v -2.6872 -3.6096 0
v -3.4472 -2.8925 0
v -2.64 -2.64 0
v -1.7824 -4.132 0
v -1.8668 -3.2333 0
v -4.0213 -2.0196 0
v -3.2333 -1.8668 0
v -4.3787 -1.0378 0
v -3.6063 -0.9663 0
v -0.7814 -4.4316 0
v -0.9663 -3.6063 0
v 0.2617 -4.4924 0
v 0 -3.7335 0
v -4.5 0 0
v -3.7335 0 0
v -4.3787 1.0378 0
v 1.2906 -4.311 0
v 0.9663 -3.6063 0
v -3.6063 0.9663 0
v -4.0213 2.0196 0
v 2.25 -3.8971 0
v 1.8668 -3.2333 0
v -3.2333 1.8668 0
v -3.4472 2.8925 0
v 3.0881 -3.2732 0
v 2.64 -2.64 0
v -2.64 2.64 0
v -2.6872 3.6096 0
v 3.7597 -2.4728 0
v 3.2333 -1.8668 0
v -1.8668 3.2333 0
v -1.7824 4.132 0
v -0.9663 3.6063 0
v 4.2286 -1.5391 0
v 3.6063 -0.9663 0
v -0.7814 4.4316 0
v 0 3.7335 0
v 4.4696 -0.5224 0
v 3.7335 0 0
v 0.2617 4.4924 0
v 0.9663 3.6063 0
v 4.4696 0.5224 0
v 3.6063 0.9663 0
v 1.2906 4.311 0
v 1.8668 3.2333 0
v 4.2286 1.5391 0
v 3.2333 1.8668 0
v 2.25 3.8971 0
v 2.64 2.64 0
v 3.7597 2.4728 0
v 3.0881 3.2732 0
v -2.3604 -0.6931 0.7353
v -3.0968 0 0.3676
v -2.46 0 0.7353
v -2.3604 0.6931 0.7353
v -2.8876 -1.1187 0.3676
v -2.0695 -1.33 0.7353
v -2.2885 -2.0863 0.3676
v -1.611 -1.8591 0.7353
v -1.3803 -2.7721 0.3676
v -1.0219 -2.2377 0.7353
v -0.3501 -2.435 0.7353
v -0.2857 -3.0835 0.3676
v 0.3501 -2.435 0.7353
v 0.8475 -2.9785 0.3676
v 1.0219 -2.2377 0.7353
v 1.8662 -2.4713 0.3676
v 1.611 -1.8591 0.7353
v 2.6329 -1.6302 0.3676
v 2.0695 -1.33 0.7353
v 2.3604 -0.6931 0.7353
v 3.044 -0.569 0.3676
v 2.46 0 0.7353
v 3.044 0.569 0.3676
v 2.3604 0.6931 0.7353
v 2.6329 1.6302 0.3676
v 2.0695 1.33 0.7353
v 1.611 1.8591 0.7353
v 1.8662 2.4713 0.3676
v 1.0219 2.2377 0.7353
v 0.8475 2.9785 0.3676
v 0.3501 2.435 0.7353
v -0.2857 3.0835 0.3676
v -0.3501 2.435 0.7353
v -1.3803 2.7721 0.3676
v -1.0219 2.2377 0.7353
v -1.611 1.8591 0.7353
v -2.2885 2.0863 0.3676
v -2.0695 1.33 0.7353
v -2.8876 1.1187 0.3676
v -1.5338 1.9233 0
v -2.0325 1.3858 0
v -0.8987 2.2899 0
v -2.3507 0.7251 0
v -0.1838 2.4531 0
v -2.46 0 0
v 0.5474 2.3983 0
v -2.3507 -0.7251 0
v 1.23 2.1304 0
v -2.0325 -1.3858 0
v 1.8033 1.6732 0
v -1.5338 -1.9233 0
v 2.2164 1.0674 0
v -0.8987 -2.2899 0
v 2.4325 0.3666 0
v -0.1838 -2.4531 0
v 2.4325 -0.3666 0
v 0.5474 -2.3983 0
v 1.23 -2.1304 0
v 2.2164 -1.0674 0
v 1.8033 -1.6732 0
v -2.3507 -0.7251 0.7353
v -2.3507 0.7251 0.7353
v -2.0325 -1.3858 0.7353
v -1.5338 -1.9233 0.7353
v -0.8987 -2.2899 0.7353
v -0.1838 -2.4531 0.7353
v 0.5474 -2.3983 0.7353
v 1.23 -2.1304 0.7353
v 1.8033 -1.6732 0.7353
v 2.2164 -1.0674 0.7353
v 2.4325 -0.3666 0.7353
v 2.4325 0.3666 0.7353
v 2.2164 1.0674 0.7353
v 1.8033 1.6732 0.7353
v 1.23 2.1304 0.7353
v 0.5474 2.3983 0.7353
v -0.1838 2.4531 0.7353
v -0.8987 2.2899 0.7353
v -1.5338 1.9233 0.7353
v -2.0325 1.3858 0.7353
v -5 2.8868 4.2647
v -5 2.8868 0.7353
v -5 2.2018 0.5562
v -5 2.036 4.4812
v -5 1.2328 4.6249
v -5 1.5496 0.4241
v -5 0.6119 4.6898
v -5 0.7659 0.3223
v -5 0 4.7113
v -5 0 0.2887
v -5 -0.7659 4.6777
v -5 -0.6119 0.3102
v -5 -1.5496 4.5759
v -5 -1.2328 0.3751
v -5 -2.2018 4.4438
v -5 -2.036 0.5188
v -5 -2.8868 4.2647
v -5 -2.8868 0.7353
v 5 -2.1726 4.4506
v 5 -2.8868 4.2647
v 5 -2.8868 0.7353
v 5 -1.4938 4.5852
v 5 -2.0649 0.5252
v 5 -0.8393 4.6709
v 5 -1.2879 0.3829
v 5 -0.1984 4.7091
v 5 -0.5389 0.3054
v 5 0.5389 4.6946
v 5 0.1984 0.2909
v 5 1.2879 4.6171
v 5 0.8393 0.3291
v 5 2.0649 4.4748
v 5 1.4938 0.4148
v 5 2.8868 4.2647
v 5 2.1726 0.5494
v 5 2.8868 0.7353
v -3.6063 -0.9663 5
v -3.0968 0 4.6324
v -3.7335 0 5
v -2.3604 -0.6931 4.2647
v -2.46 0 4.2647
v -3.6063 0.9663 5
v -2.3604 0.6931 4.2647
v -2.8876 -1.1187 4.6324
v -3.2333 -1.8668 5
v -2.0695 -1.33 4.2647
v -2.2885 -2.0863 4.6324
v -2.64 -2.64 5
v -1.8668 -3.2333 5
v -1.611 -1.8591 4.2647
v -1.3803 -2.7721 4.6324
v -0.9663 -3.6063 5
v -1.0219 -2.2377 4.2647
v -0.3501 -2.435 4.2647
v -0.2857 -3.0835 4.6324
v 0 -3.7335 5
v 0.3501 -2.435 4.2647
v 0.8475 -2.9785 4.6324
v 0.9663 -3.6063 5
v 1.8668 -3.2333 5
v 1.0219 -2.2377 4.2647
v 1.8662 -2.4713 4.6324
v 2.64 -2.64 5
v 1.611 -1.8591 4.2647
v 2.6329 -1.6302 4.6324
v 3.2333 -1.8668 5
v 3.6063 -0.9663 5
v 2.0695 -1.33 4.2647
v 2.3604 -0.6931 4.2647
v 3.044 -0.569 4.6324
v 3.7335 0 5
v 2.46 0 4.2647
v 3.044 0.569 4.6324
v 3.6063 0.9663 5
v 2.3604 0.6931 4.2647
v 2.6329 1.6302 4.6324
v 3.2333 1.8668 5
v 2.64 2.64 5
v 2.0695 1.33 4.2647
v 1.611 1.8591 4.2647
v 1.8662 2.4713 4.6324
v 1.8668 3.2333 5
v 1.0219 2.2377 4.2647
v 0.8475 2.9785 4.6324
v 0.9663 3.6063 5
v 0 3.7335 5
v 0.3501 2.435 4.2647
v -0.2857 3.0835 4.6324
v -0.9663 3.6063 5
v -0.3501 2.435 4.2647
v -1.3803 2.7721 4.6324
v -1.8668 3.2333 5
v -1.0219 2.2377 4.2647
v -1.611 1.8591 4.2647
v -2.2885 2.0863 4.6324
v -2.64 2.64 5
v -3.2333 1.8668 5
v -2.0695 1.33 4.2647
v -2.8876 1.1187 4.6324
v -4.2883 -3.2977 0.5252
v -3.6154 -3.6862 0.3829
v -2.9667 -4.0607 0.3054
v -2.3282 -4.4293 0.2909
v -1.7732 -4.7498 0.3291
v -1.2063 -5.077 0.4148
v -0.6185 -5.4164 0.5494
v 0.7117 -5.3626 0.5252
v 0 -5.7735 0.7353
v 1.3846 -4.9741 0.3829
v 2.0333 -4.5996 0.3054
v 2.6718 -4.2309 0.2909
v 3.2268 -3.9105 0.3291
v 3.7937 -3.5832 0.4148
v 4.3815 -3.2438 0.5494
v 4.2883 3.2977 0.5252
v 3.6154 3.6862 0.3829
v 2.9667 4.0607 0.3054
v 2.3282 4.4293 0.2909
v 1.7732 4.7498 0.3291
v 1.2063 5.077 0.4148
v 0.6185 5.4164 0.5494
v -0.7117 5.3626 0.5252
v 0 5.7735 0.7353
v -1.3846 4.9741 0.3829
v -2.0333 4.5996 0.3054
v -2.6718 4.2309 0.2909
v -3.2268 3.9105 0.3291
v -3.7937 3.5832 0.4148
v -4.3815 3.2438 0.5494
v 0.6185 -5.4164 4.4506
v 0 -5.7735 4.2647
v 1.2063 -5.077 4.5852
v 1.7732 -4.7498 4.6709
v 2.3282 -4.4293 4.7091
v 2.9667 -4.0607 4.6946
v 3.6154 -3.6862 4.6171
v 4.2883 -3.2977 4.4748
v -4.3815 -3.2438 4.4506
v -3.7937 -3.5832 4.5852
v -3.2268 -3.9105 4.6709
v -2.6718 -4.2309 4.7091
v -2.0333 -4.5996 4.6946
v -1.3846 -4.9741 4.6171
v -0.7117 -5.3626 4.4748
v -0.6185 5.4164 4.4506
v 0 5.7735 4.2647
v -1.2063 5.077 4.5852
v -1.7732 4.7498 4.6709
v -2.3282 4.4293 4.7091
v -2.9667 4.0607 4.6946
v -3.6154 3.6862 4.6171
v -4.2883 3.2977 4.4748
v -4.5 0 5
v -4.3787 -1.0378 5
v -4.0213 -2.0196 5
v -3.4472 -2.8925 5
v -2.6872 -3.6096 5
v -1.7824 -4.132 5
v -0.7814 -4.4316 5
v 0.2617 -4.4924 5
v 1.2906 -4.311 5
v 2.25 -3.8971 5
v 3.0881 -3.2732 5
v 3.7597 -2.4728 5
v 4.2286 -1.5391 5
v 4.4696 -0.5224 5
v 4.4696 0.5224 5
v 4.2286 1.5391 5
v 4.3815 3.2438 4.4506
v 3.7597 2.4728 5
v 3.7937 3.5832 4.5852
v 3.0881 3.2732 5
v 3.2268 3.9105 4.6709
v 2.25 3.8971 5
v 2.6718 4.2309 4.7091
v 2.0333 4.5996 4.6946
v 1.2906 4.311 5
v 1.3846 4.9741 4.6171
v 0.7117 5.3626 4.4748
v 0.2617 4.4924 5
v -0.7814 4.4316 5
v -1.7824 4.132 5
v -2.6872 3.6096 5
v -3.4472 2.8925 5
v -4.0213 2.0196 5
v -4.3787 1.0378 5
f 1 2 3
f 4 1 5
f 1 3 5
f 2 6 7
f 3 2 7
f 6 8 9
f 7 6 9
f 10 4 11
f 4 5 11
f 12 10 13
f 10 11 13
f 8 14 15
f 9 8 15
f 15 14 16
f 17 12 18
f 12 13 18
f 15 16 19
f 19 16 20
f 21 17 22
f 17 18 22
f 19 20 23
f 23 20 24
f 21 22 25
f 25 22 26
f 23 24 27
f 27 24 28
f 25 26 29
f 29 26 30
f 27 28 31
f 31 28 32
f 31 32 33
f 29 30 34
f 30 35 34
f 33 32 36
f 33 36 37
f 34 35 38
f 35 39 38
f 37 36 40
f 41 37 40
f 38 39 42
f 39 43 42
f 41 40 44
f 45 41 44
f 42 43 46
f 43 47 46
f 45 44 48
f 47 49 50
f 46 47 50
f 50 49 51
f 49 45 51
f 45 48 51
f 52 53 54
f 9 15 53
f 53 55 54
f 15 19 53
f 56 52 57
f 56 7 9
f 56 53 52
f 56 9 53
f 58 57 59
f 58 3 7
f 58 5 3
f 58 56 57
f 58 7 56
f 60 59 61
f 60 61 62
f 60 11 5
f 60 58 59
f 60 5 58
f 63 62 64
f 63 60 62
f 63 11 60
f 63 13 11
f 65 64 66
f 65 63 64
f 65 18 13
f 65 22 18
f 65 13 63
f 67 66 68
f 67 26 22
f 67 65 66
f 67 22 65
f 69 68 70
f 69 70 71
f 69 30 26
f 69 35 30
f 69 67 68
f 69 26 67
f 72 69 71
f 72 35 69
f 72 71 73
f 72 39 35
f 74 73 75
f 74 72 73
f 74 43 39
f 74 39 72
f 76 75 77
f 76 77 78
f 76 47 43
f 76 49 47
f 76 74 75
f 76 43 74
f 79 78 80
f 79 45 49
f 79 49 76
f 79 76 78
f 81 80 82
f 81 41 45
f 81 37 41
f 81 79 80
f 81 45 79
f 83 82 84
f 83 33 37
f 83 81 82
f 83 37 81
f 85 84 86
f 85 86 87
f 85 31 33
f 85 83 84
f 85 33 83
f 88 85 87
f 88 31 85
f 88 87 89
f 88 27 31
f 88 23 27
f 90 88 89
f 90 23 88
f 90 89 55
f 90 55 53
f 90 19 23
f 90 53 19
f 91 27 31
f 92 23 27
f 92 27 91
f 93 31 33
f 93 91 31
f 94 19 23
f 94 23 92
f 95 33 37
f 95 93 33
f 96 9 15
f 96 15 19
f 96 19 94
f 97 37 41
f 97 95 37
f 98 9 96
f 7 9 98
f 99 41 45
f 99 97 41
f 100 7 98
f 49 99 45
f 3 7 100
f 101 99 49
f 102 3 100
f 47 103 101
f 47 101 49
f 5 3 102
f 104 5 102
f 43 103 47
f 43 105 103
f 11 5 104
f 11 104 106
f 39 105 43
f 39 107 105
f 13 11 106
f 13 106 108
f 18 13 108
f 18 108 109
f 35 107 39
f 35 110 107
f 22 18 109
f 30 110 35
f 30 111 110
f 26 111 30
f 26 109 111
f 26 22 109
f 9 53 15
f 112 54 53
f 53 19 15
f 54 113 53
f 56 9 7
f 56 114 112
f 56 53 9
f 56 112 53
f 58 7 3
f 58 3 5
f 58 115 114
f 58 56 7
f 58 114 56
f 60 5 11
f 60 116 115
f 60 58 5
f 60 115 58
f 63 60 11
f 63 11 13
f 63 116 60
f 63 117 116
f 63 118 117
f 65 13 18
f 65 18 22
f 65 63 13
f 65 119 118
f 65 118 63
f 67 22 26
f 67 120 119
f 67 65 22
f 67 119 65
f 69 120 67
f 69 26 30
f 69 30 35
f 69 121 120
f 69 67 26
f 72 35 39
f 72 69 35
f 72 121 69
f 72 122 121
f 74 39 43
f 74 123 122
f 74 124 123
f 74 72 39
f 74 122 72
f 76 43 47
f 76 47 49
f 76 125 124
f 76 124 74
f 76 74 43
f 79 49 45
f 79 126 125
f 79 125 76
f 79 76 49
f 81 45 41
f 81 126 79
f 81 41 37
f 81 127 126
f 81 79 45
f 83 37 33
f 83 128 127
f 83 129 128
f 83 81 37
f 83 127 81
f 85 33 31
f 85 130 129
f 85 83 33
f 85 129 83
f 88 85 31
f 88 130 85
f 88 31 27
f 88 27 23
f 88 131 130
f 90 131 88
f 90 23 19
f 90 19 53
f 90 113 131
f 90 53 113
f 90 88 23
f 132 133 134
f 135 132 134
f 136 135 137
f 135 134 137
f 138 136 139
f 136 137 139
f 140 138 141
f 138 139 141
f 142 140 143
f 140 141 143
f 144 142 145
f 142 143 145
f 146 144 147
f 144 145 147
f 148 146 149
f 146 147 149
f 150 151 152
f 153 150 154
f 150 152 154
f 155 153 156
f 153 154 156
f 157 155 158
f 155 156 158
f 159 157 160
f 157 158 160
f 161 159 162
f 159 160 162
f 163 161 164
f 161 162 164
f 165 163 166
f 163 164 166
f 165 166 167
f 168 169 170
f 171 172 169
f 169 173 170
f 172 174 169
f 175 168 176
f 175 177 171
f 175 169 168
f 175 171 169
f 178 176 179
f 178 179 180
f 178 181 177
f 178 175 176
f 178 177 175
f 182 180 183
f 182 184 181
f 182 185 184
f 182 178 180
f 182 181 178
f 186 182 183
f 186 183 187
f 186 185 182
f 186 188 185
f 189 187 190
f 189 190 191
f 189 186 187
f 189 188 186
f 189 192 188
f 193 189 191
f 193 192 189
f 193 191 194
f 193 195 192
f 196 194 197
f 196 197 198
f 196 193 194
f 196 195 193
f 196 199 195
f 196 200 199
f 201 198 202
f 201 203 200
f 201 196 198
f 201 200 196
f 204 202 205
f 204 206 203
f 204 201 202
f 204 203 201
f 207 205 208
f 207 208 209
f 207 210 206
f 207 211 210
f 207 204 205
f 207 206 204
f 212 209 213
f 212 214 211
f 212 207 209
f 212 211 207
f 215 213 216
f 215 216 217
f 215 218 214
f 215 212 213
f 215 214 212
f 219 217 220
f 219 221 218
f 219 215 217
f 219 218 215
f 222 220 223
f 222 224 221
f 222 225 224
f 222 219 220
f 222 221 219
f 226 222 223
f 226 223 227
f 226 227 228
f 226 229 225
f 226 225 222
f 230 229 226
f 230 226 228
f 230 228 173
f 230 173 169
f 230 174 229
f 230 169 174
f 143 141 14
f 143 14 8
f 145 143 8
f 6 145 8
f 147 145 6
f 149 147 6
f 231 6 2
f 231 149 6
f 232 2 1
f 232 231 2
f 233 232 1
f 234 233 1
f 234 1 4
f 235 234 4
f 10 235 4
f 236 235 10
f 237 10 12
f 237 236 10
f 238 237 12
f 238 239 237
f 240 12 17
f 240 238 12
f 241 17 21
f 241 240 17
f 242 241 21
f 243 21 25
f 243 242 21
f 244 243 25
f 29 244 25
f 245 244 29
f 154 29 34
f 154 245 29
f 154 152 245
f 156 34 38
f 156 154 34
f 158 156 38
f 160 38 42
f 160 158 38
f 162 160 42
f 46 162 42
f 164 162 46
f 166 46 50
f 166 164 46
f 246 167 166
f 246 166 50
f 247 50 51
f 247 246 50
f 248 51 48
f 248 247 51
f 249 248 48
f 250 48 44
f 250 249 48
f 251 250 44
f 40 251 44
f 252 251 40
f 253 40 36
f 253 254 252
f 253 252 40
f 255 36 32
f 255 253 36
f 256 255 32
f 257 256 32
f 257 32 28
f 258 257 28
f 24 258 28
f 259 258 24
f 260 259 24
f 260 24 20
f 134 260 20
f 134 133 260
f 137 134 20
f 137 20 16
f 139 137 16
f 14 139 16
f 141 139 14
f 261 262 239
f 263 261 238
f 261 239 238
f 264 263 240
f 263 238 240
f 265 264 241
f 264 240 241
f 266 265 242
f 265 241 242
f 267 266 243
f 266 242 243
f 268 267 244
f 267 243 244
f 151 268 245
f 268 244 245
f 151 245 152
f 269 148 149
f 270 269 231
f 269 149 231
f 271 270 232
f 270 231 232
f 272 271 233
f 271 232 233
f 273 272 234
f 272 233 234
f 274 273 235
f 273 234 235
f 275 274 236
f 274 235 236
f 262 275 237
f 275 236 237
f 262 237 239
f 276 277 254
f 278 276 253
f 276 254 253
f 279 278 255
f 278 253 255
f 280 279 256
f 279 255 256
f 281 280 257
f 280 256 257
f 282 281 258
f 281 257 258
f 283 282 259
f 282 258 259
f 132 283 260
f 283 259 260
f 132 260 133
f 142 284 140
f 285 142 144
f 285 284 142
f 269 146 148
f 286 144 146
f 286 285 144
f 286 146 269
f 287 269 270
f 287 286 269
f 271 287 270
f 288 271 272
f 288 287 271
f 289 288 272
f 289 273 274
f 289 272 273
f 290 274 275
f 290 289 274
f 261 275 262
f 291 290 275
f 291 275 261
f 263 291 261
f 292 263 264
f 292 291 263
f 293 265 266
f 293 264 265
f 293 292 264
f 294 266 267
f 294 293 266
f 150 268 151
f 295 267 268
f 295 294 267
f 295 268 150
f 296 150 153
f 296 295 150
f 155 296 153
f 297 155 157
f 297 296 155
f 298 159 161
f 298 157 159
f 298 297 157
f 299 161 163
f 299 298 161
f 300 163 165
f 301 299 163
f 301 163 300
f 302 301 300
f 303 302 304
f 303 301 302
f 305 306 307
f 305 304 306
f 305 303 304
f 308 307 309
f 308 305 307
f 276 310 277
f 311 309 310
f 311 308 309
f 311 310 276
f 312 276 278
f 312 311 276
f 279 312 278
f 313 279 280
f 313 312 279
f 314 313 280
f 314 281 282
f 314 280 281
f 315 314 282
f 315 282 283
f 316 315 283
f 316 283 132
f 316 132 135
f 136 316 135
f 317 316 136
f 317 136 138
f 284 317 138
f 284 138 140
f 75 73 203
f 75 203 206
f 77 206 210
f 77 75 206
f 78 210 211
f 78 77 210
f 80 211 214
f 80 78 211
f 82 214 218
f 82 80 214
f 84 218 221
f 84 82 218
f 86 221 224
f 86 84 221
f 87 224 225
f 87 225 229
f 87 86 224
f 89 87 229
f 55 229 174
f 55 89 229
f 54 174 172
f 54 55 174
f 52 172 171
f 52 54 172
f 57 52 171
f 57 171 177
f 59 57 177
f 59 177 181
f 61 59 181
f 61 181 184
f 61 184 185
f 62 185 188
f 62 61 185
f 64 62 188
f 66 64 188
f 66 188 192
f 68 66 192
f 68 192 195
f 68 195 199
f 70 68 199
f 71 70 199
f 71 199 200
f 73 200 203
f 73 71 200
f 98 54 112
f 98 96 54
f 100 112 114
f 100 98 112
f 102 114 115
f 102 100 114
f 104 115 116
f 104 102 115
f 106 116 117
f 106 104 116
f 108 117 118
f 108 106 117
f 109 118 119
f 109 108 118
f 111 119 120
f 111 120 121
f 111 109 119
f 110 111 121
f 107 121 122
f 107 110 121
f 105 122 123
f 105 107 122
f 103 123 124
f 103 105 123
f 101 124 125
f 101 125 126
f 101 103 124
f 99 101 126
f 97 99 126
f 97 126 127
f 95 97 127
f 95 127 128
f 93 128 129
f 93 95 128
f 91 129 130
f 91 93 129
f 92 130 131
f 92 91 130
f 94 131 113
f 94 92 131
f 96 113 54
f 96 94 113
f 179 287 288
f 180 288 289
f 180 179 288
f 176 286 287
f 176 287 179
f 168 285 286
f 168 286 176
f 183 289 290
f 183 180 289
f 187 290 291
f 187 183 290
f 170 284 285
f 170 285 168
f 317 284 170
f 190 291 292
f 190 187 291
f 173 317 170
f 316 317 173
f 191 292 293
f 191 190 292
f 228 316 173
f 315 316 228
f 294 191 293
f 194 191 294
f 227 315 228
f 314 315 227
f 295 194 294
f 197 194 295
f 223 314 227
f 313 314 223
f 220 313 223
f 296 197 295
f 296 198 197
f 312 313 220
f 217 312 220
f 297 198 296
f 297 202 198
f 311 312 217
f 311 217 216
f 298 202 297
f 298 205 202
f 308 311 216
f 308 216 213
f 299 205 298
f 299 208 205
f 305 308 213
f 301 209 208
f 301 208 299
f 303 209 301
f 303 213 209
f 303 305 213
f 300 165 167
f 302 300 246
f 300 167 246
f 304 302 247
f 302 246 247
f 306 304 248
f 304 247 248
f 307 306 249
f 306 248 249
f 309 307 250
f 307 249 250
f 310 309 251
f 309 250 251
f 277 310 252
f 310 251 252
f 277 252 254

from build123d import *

# Parameters (mm, degrees)
SKETCH_1_R        = 2.46
EXTRUDE_777_DEPTH = 5


with BuildPart() as part:
    # Эскиз1 → Extrude 777 (new body)
    with BuildSketch(Plane.XY):
        Polygon((0, 5.773502692), (-5, 2.886751346), (-5, -2.886751346), (0, -5.773502692), (5, -2.886751346), (5, 2.886751346), align=None)
        Circle(SKETCH_1_R, mode=Mode.SUBTRACT)
    extrude(amount=EXTRUDE_777_DEPTH)

    # Эскиз2 → Вырез-Повернуть1 (revolve, cut)
    with BuildSketch(Plane(origin=(0, 0, 0), x_dir=(0, 0, -1), z_dir=(1, 0, 0))):
        Polygon((-5, 4.5), (-5, 5.773502692), (-4.264742878, 5.773502692), align=None)
        Polygon((-4.264742878, 2.46), (-5, 2.46), (-5, 3.733502692), align=None)
        Polygon((0, 3.733502692), (0, 2.46), (-0.735257122, 2.46), align=None)
        Polygon((0, 4.5), (-0.735257122, 5.773502692), (0, 5.773502692), align=None)
    revolve(axis=Axis((0, 0, 0), (0, 0, 1)), mode=Mode.SUBTRACT)


with BuildPart() as body_2:
    # Эскиз2<3> → Revolve 1099 (revolve)
    with BuildSketch(Plane(origin=(0, 0, 0), x_dir=(0, 0, -1), z_dir=(1, 0, 0))):
        Polygon((0, 2.46), (0, 3.733502692), (-0.735257122, 2.46), align=None)
    revolve(axis=Axis((0, 0, 0), (0, 0, 1)))


solid = Compound([part.part, body_2.part])
